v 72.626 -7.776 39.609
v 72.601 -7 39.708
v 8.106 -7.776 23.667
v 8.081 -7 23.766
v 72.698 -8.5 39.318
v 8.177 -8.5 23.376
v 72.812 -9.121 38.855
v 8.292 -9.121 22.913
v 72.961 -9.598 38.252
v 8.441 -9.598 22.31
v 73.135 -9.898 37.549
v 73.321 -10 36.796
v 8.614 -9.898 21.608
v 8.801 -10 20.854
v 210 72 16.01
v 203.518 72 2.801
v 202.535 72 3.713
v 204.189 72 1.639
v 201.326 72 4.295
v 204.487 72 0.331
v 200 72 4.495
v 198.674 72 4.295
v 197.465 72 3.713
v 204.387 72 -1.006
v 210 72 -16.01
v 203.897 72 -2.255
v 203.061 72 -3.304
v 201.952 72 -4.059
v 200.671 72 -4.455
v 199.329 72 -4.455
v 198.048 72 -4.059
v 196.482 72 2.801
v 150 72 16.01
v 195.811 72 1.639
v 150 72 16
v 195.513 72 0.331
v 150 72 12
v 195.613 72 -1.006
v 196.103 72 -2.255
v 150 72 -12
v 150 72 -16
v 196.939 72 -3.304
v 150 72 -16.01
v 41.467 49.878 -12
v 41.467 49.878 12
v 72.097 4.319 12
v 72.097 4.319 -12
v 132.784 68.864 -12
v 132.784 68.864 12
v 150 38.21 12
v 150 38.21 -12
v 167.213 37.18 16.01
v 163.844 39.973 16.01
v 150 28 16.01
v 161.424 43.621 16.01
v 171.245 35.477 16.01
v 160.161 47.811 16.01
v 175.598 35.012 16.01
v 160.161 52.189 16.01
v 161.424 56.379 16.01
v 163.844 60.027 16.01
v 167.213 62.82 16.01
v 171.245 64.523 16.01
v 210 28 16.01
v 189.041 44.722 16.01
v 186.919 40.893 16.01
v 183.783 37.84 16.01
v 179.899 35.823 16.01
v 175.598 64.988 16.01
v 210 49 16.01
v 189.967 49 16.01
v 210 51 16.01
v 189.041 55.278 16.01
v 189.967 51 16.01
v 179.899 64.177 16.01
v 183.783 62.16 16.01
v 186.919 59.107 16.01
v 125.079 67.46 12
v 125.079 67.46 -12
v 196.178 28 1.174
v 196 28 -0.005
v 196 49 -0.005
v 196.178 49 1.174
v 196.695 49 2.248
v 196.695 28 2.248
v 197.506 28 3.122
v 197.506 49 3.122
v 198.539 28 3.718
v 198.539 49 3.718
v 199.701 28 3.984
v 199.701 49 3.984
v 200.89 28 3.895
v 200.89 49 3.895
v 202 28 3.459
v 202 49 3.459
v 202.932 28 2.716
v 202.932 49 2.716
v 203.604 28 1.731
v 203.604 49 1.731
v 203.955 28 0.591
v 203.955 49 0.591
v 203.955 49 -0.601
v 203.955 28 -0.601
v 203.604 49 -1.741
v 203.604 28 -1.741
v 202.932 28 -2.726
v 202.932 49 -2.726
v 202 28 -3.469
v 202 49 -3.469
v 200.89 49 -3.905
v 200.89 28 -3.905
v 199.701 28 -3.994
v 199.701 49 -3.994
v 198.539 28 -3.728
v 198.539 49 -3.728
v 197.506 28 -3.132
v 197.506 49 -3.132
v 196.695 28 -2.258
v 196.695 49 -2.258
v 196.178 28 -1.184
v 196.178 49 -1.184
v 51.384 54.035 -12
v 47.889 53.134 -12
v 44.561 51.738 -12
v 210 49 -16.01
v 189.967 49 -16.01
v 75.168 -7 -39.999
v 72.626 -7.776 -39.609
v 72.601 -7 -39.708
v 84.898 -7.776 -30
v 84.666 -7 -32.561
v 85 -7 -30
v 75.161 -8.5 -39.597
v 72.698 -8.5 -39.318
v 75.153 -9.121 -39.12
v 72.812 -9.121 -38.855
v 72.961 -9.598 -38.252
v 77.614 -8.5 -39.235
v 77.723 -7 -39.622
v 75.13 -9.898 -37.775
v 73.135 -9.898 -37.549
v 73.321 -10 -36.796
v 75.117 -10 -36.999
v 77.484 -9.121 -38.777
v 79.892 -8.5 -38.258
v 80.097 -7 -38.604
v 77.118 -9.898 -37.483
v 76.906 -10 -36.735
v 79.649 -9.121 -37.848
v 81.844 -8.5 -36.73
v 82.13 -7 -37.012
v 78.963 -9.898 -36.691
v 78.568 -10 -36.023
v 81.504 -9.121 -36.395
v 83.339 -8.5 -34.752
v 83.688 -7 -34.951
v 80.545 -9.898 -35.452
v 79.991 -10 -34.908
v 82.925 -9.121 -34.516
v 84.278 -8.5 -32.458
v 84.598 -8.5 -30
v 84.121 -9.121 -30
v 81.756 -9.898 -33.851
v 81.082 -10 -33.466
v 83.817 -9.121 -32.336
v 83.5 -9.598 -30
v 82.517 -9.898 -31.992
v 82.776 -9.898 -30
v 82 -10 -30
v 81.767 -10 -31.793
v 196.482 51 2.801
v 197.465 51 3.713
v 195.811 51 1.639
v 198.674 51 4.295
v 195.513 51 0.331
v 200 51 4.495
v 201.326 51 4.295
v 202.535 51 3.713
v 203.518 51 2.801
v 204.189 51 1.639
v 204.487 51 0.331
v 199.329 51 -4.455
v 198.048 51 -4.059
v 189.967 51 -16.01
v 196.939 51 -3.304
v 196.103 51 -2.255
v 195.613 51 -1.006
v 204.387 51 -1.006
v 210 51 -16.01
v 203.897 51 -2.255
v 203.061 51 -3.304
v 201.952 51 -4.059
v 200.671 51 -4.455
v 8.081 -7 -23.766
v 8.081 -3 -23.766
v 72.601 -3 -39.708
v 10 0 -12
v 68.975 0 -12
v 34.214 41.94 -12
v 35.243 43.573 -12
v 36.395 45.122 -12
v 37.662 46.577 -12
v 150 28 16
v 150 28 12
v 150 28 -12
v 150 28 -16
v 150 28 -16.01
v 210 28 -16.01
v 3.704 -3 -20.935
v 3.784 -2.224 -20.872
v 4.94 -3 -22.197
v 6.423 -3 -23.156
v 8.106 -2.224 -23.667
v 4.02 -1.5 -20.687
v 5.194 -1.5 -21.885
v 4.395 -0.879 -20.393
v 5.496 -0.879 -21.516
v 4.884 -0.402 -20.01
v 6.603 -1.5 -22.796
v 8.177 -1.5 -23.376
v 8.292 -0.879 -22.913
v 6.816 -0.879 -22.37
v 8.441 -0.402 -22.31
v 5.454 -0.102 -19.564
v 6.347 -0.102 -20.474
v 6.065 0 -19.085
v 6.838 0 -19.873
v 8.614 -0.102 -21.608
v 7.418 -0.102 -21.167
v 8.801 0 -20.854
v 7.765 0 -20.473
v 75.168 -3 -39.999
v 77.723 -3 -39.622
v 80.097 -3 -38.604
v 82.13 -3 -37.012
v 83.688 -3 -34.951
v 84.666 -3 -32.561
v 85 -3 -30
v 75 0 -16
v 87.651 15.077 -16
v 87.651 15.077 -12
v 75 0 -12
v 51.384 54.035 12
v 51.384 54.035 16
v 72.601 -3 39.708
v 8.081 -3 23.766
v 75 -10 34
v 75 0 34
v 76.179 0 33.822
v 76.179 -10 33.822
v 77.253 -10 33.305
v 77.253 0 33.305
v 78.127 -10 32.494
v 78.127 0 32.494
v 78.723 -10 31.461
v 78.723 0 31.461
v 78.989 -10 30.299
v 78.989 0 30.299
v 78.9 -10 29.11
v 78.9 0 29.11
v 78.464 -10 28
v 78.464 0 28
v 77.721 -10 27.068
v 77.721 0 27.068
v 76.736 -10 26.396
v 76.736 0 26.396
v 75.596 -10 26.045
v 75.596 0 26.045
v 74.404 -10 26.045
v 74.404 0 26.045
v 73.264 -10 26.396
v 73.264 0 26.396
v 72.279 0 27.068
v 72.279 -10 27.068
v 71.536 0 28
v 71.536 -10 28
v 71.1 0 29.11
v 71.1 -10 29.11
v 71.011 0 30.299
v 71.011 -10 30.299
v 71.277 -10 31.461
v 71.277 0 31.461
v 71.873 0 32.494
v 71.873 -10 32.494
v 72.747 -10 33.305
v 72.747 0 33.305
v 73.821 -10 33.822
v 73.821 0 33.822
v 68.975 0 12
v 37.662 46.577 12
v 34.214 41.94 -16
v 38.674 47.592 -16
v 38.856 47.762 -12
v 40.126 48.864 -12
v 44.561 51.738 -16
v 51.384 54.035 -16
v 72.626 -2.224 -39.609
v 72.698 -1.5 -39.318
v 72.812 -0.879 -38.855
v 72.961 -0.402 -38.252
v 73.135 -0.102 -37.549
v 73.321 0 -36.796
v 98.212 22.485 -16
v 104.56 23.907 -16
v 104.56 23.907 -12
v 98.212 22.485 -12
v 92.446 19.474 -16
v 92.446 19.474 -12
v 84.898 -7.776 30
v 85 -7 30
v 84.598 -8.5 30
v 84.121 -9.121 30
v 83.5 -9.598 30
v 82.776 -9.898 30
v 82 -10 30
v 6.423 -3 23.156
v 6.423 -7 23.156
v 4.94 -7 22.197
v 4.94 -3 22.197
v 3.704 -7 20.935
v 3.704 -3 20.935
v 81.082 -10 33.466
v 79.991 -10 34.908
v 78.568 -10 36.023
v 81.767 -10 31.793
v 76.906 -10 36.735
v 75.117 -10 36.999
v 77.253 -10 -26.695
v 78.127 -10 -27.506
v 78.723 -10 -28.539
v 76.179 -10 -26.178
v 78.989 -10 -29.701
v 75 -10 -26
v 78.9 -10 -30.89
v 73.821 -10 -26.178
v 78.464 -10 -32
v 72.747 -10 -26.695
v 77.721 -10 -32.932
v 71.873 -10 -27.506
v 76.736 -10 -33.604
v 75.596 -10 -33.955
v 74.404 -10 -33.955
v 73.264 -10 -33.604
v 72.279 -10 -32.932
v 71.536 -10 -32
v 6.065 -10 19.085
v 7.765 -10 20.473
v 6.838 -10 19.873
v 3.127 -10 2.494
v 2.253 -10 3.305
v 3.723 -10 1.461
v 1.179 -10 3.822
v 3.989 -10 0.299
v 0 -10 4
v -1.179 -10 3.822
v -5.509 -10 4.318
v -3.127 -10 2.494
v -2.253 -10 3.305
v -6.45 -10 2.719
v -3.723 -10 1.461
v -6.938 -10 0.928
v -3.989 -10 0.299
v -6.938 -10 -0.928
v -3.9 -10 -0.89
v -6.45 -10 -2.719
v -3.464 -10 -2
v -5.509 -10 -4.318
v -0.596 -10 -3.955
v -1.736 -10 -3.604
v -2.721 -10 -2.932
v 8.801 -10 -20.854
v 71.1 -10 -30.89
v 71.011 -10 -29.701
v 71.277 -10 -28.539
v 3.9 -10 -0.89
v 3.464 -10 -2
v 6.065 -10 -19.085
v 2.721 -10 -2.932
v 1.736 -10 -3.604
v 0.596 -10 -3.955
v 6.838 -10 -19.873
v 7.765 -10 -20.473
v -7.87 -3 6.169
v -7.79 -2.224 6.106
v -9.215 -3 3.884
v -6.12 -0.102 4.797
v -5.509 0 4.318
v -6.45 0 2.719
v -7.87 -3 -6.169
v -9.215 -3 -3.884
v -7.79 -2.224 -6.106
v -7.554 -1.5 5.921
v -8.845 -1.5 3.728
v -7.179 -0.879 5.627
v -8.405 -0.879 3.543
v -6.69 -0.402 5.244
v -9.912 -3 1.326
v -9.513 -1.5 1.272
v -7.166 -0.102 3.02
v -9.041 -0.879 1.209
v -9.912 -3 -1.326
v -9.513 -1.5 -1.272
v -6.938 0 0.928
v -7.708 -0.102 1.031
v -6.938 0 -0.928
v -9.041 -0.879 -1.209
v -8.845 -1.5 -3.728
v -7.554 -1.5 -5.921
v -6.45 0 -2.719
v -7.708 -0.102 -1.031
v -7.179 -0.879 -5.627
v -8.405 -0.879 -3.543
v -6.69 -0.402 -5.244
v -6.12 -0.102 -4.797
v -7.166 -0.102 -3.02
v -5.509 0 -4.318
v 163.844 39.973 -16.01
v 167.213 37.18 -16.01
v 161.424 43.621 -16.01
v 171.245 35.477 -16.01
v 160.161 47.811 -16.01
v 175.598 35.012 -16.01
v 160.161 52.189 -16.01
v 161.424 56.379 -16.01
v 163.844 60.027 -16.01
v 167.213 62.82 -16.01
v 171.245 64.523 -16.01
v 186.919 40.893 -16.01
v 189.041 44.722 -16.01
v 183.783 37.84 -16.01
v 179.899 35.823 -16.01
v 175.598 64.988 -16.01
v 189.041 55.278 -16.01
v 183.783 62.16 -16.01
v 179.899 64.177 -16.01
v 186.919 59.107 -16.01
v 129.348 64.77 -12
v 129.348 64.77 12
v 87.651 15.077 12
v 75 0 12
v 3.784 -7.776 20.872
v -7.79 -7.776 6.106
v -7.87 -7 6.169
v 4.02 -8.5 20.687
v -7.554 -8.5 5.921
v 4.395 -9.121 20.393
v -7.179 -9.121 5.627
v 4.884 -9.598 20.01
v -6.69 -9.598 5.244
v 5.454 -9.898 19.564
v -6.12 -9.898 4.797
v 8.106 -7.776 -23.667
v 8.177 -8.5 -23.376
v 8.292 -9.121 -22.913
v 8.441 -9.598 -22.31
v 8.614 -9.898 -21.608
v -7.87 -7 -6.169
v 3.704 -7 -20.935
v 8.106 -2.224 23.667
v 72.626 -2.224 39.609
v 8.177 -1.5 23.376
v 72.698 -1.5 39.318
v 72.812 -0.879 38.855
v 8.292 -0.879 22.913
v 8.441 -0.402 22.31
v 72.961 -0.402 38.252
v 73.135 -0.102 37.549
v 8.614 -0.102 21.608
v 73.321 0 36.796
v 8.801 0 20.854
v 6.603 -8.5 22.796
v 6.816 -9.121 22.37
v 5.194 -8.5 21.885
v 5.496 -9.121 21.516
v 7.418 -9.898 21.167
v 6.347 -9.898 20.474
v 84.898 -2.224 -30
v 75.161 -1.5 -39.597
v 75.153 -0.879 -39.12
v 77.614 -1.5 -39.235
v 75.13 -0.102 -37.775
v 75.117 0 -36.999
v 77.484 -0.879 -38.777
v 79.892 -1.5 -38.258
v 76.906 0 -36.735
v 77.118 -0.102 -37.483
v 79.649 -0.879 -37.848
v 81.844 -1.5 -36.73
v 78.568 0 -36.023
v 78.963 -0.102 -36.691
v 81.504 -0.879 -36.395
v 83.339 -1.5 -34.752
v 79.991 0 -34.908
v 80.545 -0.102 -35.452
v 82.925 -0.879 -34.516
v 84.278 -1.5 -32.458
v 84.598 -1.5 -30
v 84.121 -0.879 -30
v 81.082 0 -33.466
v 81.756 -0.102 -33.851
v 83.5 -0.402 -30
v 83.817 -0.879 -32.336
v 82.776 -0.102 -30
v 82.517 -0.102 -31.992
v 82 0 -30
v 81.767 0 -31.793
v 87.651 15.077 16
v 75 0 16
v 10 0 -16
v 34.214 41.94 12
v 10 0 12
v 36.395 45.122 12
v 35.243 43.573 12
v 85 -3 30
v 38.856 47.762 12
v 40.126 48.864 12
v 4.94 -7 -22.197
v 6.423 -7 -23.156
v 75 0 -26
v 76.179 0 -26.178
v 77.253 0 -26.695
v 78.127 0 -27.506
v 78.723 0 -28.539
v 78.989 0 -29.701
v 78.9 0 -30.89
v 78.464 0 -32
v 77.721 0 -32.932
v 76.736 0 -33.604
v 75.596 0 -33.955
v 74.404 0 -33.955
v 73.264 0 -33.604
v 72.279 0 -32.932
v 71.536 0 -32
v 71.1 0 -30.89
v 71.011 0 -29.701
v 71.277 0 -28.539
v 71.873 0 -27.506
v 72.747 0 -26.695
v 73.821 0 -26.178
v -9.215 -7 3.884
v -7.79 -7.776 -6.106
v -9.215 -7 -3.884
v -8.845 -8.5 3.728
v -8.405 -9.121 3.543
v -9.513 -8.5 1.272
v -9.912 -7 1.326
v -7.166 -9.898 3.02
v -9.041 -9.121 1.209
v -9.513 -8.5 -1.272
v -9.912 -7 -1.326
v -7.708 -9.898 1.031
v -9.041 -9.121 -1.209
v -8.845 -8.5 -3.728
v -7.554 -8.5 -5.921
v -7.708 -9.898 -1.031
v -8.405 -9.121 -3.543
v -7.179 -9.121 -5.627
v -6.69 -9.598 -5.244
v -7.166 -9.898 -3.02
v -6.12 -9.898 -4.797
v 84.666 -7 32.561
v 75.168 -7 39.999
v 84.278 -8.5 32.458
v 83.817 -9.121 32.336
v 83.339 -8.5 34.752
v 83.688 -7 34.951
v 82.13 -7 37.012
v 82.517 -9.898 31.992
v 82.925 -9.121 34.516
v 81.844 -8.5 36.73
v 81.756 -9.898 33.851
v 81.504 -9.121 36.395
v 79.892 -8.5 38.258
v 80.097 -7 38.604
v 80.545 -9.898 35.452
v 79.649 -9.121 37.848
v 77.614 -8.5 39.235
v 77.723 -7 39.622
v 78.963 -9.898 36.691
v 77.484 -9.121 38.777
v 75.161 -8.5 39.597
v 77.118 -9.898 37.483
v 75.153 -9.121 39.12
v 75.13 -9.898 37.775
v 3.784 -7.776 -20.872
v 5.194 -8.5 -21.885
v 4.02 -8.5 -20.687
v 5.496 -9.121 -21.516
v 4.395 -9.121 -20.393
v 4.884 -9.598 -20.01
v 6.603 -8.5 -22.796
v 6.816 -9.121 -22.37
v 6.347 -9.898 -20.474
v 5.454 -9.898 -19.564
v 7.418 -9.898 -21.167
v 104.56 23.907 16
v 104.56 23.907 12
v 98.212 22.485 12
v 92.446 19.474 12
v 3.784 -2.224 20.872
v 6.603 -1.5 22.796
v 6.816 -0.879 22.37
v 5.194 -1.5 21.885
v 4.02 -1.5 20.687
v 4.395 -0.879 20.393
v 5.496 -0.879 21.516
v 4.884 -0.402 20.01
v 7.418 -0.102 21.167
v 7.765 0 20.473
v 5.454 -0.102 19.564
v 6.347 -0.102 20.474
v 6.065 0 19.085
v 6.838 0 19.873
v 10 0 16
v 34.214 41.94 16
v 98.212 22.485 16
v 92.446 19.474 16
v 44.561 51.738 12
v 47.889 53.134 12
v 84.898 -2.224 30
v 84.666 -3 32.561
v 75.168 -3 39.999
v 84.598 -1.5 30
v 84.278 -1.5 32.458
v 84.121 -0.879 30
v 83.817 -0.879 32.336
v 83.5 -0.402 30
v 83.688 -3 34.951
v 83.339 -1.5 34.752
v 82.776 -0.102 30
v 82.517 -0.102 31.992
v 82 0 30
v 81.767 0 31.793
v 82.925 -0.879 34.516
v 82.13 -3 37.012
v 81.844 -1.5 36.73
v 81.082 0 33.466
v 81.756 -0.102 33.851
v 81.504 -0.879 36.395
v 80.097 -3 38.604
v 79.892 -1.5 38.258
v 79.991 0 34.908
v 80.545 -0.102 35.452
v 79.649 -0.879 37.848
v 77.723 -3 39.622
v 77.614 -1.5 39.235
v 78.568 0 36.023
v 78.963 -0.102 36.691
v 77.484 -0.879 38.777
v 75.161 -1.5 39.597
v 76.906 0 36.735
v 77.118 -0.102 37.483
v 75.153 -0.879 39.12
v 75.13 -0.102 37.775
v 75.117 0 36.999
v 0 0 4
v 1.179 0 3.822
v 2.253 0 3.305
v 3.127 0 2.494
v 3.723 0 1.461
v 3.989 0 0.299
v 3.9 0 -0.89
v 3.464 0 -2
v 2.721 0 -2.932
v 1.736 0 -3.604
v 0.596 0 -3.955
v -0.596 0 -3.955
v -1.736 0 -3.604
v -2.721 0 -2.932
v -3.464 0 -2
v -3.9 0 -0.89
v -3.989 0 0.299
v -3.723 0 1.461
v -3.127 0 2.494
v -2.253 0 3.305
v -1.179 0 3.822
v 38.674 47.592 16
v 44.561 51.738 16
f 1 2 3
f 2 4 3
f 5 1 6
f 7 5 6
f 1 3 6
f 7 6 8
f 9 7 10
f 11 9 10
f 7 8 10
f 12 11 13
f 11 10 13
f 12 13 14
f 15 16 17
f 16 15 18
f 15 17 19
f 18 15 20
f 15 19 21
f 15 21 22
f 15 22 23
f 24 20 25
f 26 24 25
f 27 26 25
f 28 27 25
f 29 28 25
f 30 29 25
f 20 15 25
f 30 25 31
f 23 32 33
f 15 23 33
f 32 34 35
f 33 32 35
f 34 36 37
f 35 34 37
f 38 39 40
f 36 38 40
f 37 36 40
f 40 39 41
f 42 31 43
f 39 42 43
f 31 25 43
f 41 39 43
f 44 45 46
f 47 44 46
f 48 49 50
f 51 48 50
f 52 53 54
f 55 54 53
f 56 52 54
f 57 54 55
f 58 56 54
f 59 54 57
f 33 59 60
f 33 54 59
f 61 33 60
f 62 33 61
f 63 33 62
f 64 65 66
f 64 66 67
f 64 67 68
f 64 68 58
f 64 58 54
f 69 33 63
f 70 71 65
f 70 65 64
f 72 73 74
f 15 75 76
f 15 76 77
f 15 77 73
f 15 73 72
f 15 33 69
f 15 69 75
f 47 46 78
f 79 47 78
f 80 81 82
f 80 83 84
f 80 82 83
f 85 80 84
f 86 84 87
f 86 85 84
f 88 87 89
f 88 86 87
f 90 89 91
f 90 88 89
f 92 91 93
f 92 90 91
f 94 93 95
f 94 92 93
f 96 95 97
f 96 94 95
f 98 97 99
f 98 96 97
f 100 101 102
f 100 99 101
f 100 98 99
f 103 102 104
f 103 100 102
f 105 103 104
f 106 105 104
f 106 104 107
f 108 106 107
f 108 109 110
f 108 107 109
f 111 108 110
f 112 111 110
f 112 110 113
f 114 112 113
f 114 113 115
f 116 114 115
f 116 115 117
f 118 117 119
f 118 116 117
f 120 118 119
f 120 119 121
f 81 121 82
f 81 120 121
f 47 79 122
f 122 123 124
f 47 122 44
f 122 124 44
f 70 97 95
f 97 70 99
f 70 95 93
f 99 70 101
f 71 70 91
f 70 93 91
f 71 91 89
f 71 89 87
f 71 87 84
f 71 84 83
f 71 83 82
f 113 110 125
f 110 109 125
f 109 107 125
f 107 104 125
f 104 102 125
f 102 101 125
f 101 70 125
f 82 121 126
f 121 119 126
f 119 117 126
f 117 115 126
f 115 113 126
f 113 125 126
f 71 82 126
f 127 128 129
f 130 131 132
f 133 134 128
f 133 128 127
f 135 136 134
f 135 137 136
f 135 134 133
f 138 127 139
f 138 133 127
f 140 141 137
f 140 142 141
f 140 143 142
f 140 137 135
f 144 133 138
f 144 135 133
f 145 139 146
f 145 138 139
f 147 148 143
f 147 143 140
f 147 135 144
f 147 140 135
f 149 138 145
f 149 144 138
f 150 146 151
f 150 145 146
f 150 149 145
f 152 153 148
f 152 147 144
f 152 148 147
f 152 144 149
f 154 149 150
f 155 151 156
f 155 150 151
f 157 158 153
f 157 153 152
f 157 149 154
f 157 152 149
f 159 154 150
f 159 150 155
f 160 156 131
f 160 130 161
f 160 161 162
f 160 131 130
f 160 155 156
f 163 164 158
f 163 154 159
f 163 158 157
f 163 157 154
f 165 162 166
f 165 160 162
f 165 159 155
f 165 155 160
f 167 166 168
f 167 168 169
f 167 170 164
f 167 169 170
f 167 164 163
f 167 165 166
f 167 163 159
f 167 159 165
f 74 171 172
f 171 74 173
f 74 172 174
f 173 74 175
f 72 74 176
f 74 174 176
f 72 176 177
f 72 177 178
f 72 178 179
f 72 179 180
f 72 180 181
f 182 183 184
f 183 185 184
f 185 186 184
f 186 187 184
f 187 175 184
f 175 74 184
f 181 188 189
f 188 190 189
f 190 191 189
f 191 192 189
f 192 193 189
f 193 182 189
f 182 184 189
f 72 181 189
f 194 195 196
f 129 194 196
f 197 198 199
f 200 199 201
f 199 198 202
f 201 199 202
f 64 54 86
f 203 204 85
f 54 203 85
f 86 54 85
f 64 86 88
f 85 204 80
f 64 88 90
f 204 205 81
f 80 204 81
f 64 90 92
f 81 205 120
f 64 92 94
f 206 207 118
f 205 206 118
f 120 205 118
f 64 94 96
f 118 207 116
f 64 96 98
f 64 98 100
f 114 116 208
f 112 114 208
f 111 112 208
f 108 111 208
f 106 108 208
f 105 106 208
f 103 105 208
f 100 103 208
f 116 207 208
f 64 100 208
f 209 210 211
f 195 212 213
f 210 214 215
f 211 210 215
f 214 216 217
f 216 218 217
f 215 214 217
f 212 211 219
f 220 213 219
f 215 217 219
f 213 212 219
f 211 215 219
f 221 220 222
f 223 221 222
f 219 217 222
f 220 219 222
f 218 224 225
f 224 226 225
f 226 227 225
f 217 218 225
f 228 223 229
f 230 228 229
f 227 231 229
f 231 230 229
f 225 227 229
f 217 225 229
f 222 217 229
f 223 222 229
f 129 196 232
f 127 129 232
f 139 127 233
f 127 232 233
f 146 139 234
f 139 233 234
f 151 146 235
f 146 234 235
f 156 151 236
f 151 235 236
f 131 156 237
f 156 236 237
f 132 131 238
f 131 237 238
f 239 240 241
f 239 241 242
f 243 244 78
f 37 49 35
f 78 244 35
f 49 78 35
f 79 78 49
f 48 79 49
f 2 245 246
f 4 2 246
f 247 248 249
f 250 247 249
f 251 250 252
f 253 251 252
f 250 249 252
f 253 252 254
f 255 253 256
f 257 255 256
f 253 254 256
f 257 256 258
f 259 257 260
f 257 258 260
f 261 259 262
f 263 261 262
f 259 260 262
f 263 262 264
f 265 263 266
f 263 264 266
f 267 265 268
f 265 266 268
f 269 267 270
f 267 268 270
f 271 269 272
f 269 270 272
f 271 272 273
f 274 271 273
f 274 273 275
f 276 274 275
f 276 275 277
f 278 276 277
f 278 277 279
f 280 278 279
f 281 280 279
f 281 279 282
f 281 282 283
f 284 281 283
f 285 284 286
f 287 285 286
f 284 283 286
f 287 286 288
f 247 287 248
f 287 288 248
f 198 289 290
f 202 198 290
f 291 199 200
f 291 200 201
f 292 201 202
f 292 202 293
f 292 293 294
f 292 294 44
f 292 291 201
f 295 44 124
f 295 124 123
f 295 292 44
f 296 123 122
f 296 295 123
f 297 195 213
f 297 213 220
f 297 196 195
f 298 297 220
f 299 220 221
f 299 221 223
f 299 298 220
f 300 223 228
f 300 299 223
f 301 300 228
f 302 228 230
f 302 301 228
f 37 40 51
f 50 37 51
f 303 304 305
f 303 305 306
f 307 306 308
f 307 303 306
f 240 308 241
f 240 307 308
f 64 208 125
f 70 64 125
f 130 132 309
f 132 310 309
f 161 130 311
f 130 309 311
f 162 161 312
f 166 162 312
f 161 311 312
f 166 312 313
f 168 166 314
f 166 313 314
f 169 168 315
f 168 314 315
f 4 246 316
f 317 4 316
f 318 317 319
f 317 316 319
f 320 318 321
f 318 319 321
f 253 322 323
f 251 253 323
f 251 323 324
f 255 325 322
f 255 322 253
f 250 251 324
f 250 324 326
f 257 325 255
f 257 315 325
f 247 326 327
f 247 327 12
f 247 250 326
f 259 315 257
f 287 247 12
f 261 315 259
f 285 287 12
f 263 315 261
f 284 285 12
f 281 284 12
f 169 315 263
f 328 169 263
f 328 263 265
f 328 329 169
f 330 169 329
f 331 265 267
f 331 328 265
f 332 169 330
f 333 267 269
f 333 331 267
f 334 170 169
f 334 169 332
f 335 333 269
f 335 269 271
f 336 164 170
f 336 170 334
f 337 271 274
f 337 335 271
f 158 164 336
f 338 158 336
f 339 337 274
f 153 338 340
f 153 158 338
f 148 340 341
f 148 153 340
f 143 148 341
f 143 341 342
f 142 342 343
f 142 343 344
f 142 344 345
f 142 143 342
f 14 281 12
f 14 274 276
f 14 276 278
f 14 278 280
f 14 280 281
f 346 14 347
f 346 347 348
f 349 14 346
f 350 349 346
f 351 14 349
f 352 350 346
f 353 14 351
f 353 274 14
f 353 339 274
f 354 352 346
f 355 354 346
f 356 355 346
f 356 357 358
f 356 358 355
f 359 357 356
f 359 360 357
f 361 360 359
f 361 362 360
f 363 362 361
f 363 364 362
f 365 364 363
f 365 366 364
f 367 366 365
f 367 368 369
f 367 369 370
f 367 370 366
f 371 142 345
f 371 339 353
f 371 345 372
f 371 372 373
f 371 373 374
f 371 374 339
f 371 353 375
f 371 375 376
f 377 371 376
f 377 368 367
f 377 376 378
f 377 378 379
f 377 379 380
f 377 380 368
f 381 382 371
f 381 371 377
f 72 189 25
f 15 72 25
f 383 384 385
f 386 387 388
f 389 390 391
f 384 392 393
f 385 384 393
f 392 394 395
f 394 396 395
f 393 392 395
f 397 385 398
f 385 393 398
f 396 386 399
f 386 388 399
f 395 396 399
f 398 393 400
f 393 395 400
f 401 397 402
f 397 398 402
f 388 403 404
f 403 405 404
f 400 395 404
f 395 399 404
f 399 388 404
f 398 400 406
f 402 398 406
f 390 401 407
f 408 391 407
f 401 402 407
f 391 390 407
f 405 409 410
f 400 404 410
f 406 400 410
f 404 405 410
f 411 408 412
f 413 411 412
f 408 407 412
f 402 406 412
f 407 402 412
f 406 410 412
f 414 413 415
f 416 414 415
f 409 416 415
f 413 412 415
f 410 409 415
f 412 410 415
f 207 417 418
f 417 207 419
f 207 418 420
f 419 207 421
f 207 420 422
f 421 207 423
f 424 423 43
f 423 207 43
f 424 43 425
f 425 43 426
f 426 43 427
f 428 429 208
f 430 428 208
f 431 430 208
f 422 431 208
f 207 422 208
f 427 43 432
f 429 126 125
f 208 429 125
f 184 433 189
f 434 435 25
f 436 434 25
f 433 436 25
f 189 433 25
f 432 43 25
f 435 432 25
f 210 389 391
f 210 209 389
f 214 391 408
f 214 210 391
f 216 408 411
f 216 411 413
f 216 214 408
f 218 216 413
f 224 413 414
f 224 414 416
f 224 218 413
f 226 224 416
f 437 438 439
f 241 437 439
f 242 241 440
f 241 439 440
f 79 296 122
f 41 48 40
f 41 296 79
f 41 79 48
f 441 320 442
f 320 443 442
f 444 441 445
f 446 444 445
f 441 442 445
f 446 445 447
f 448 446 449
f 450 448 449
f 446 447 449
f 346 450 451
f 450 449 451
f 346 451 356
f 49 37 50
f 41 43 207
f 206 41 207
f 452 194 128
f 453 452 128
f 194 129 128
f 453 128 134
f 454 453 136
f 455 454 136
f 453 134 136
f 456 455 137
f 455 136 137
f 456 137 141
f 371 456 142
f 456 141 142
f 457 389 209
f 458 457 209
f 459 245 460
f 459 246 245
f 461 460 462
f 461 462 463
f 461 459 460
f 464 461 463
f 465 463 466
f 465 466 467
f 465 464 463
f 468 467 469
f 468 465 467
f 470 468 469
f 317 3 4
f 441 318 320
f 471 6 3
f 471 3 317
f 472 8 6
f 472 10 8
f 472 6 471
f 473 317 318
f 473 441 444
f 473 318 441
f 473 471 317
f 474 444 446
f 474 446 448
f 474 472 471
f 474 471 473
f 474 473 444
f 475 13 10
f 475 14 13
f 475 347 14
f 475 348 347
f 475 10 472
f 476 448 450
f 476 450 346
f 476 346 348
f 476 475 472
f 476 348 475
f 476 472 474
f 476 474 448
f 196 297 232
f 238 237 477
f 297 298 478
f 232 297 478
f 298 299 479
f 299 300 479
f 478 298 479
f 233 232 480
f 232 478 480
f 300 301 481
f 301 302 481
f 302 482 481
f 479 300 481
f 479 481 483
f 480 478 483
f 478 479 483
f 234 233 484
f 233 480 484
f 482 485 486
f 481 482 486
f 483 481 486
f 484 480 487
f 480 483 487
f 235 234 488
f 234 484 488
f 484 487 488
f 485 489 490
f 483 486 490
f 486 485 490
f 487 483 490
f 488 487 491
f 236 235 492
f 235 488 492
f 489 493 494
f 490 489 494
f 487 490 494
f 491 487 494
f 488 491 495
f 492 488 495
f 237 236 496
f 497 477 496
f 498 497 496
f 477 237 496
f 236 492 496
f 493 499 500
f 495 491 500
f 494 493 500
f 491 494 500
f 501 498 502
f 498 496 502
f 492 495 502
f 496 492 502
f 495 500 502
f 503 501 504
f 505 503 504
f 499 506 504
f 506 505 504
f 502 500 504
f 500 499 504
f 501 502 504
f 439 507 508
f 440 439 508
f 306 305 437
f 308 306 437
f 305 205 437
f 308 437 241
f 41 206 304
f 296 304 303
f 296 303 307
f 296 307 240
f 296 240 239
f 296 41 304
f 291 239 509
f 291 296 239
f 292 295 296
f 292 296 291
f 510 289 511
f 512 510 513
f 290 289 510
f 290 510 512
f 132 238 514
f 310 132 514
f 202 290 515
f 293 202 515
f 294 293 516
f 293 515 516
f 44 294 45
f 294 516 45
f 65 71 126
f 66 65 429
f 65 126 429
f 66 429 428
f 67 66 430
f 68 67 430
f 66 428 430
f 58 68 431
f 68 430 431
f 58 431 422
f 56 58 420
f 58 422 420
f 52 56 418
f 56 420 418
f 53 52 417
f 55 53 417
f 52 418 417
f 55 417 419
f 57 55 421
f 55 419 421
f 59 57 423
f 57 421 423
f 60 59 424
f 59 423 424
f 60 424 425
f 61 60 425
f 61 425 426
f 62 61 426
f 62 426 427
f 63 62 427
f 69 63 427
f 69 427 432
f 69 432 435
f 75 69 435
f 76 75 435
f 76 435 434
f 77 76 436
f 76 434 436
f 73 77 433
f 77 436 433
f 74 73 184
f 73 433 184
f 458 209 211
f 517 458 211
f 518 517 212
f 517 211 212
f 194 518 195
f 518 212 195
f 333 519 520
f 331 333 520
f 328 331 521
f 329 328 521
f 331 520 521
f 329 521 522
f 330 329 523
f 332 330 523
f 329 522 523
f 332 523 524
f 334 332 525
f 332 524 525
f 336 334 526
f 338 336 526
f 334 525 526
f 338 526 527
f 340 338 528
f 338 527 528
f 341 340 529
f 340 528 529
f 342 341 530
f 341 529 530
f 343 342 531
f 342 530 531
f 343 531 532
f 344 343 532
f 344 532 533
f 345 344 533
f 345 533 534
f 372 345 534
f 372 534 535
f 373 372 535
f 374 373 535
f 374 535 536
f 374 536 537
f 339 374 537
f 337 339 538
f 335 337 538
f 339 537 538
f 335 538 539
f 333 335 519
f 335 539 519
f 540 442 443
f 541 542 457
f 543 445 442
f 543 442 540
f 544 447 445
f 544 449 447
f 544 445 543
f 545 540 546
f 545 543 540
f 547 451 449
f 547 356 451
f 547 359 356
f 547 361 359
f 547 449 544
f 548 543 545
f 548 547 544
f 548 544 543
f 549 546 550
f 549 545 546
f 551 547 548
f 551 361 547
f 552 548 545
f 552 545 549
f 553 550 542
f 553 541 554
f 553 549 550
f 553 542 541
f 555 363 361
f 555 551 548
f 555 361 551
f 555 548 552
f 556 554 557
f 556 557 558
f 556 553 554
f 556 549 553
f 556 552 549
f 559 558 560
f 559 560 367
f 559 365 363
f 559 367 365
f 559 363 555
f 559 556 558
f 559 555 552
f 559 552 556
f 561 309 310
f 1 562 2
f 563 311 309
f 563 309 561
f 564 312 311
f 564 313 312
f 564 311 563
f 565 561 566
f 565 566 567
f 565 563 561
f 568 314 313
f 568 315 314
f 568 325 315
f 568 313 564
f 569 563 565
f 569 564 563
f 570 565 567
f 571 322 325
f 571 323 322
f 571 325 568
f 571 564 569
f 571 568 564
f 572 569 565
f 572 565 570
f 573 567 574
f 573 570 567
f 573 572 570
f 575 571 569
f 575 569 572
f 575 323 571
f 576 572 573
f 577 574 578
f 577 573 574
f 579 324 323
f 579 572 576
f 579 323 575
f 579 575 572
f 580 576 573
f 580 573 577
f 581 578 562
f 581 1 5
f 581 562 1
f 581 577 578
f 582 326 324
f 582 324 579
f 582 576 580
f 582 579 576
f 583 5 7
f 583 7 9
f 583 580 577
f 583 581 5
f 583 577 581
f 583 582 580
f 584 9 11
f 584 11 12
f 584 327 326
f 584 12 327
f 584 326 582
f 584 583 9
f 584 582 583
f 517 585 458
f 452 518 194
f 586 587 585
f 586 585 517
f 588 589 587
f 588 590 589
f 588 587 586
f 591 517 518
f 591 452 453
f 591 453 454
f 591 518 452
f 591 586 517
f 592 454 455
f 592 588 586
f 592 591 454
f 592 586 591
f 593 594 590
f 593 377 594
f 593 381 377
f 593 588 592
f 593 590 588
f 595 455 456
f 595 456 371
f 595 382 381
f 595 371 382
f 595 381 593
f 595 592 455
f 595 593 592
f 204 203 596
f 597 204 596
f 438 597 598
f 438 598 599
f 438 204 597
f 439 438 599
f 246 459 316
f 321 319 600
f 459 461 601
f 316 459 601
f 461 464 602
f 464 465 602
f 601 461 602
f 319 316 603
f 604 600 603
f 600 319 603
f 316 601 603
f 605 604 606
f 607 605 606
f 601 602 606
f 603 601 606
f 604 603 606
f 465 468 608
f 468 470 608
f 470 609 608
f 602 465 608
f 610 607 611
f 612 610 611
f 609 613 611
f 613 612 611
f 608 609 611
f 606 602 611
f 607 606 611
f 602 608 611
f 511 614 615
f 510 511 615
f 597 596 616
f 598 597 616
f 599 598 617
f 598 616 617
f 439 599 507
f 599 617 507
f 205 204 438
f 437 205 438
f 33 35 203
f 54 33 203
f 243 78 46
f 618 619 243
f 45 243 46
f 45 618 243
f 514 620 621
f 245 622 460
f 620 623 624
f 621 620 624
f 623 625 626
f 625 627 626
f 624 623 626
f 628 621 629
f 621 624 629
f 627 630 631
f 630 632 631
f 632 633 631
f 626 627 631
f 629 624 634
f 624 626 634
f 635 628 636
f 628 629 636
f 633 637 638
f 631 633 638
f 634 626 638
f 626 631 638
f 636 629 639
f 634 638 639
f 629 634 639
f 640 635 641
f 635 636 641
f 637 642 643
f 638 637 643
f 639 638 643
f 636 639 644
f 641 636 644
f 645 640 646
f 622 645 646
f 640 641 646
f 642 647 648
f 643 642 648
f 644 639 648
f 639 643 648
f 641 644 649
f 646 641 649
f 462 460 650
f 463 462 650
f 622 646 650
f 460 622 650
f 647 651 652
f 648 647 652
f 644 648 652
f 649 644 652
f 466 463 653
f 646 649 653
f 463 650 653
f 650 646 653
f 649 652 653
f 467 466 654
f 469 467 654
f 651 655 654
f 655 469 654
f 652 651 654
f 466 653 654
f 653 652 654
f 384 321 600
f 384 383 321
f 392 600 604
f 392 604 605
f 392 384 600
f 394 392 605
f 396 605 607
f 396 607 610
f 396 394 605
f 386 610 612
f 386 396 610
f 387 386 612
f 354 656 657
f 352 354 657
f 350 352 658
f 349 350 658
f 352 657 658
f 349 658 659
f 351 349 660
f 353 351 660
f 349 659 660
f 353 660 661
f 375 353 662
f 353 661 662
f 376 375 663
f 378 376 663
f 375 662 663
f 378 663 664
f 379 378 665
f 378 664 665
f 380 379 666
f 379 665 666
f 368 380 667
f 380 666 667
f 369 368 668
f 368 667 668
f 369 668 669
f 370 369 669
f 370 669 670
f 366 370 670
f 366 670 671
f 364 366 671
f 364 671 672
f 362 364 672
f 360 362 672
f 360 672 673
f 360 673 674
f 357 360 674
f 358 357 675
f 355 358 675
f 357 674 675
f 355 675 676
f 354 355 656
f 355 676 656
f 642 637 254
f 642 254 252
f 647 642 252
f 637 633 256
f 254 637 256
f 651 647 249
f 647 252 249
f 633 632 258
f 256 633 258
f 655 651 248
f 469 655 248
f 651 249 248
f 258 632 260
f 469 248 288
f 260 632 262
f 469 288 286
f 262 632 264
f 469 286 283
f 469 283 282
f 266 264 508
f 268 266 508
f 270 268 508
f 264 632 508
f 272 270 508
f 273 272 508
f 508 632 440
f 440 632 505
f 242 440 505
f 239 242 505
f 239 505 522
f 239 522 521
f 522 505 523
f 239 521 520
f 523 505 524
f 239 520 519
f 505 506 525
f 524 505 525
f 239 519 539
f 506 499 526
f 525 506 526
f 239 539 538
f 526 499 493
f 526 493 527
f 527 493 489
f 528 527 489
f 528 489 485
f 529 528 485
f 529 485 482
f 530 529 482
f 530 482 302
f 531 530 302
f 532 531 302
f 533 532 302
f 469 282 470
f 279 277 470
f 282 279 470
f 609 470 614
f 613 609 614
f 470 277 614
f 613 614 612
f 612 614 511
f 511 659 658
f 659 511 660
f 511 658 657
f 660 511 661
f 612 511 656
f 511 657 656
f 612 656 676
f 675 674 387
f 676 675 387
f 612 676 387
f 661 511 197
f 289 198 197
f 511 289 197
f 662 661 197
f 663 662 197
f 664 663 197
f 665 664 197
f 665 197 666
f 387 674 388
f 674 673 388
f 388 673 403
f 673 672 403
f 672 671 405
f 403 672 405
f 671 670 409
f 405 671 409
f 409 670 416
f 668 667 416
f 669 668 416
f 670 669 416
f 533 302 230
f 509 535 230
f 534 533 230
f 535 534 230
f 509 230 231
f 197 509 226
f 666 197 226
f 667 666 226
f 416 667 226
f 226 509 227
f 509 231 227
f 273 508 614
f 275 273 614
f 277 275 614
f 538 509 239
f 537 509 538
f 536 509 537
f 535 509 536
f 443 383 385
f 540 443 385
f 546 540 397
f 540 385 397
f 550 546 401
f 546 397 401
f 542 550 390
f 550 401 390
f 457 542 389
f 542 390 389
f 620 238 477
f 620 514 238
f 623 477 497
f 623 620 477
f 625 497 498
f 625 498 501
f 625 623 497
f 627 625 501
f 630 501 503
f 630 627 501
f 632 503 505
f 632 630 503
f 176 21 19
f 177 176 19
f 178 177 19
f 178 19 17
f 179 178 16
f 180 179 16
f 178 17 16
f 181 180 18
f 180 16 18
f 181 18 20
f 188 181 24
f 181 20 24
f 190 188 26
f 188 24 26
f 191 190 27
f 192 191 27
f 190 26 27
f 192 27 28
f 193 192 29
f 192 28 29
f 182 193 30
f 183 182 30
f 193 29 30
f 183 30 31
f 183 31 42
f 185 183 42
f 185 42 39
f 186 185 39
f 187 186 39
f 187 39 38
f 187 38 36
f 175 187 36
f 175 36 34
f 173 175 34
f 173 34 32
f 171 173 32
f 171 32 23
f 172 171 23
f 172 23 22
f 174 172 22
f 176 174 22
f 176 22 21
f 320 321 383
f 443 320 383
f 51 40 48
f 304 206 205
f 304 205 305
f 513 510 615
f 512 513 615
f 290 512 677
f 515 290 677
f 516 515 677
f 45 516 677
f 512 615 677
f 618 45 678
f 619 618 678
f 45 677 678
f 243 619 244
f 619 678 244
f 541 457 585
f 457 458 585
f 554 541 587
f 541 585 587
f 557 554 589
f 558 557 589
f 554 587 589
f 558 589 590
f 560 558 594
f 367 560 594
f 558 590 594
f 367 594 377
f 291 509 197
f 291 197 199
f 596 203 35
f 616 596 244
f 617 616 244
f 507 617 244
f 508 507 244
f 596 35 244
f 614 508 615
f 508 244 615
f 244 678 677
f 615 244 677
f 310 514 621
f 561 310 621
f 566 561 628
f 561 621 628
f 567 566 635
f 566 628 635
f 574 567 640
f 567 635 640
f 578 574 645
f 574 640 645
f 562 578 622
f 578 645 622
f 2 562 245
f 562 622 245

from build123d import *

# Parameters (mm, degrees)
BOSS_EXTRUDE1_DEPTH      = 4
BOSS_EXTRUDE2_DEPTH      = 0.01
BOSS_EXTRUDE2_DEPTH_BACK = 32.01
SKETCH4_R                = 4.5
CUT_EXTRUDE1_DEPTH       = 23
CUT_EXTRUDE2_DEPTH       = 217.234410074
CUT_EXTRUDE2_DEPTH_BACK  = 217.234410074
SKETCH5_R                = 4
SKETCH6_R                = 4
BOSS_EXTRUDE3_DEPTH      = 10
FILLET1_R                = 3
BOSS_EXTRUDE6_DEPTH      = 24


with BuildPart() as part:
    # Sketch2 → Boss-Extrude1 (new body)
    with BuildSketch(Plane.XY.offset(16)):
        with BuildLine():
            Line((10, 0), (34.214158147, 41.940152173))
            ThreePointArc((34.214158147, 41.940152173), (41.467493607, 49.878296982), (51.384329922, 54.035384403))
            Line((51.384329922, 54.035384403), (150, 72))
            Line((150, 72), (150, 28))
            Line((150, 28), (104.559799809, 23.906962122))
            ThreePointArc((104.559799809, 23.906962122), (95.230440402, 21.168208391), (87.651490086, 15.077458761))
            Line((87.651490086, 15.077458761), (75, 0))
            Line((75, 0), (10, 0))
        make_face()
    extrude(amount=-BOSS_EXTRUDE1_DEPTH)


with BuildPart() as body_2:
    # Mirror2: mirrored copy
    add(part.part.mirror(Plane.XY))


with BuildPart() as part_1:
    add(part.part)

    add(body_2.part)  # Boss-Extrude2 merges body 2
    # Sketch3 → Boss-Extrude2 (add, two sides: drawn at the far end of the back side and taken through both)
    with BuildSketch(Plane.XY.offset(16).offset(-BOSS_EXTRUDE2_DEPTH_BACK)):
        with BuildLine():
            Line((189.966629547, 51), (210, 51))
            Line((210, 51), (210, 72))
            Line((210, 72), (150, 72))
            Line((150, 72), (150, 28))
            Line((150, 28), (210, 28))
            Line((210, 28), (210, 49))
            Line((210, 49), (189.966629547, 49))
            ThreePointArc((189.966629547, 49), (160, 50), (189.966629547, 51))
        make_face()
    extrude(amount=BOSS_EXTRUDE2_DEPTH + BOSS_EXTRUDE2_DEPTH_BACK)

    # Sketch4 → Cut-Extrude1 (cut)
    with BuildSketch(Plane(origin=(0, 72, 0), x_dir=(1, 0, 0), z_dir=(0, 1, 0))):
        with Locations(Location((200, 0.005, 0), (0, 0, 270))):
            Circle(SKETCH4_R)
    extrude(amount=-CUT_EXTRUDE1_DEPTH, mode=Mode.SUBTRACT)

    # Sketch5 → Cut-Extrude2 (cut, two sides: drawn at the far end of the back side and taken through both)
    with BuildSketch(Plane(origin=(0, 49, 0), x_dir=(1, 0, 0), z_dir=(0, 1, 0)).offset(-CUT_EXTRUDE2_DEPTH_BACK)):
        with Locations(Location((200, 0.005, 0), (0, 0, 180))):
            Circle(SKETCH5_R)
    extrude(amount=CUT_EXTRUDE2_DEPTH + CUT_EXTRUDE2_DEPTH_BACK, mode=Mode.SUBTRACT)

    # Sketch6 → Boss-Extrude3 (add)
    with BuildSketch(Plane(origin=(0, 0, 0), x_dir=(1, 0, 0), z_dir=(0, 1, 0))):
        with BuildLine():
            Line((-7.870410355, 6.169006472), (3.703671716, 20.935205177))
            ThreePointArc((3.703671716, 20.935205177), (5.655280169, 22.717396042), (8.081072691, 23.766448222))
            Line((8.081072691, 23.766448222), (72.601340863, 39.708060277))
            ThreePointArc((72.601340863, 39.708060277), (81.164957771, 37.873582138), (85, 30))
            Line((85, 30), (85, -30))
            ThreePointArc((85, -30), (81.164957771, -37.873582138), (72.601340863, -39.708060277))
            Line((72.601340863, -39.708060277), (8.081072691, -23.766448222))
            ThreePointArc((8.081072691, -23.766448222), (5.655280169, -22.717396042), (3.703671716, -20.935205177))
            Line((3.703671716, -20.935205177), (-7.870410355, -6.169006472))
            ThreePointArc((-7.870410355, -6.169006472), (-10, 0), (-7.870410355, 6.169006472))
        make_face()
        with Locations(Location((75, 30, 0), (0, 0, 270))):
            Circle(SKETCH6_R, mode=Mode.SUBTRACT)
        with Locations(Location((75, -30, 0), (0, 0, 270))):
            Circle(SKETCH6_R, mode=Mode.SUBTRACT)
        with Locations(Location((0, 0, 0), (0, 0, 270))):
            Circle(SKETCH6_R, mode=Mode.SUBTRACT)
    extrude(amount=-BOSS_EXTRUDE3_DEPTH)

    # Fillet1
    fillet1_edges = [part_1.edges().sort_by_distance(p)[0] for p in [
        (5.655280169, 0, -22.717396042),
        (-2.083369319, 0, -13.552105825),
        (-10, 0, 0),
        (-2.083369319, 0, 13.552105825),
        (5.655280169, 0, 22.717396042),
        (40.341206777, 0, 31.73725425),
        (81.164957771, 0, 37.873582138),
        (85, 0, 0),
        (81.164957771, 0, -37.873582138),
        (40.341206777, 0, -31.73725425),
        (5.655280169, -10, -22.717396042),
        (40.341206777, -10, -31.73725425),
        (81.164957771, -10, -37.873582138),
        (85, -10, 0),
        (81.164957771, -10, 37.873582138),
        (40.341206777, -10, 31.73725425),
        (5.655280169, -10, 22.717396042),
        (-2.083369319, -10, 13.552105825),
        (-10, -10, 0),
        (-2.083369319, -10, -13.552105825),
    ]]
    fillet(fillet1_edges, radius=FILLET1_R)

    # Sketch9 → Boss-Extrude6 (add)
    with BuildSketch(Plane(origin=(0, 0, 12), x_dir=(-1, 0, 0), z_dir=(0, 0, -1))):
        with BuildLine():
            Line((-75, 0), (-68.975115859, 0))
            Line((-68.975115859, 0), (-37.662167154, 46.576791386))
            ThreePointArc((-37.662167154, 46.576791386), (-39.481454935, 48.323643003), (-41.467493607, 49.878296982))
            Line((-41.467493607, 49.878296982), (-72.096679368, 4.31857634))
            Line((-72.096679368, 4.31857634), (-125.078747354, 67.460146206))
            Line((-125.078747354, 67.460146206), (-132.783511462, 68.863707378))
            Line((-132.783511462, 68.863707378), (-150, 38.210356026))
            Line((-150, 38.210356026), (-150, 28))
            Line((-150, 28), (-129.348247033, 64.769718653))
            Line((-129.348247033, 64.769718653), (-75, 0))
        make_face()
    extrude(amount=BOSS_EXTRUDE6_DEPTH)


solid = part_1.part
